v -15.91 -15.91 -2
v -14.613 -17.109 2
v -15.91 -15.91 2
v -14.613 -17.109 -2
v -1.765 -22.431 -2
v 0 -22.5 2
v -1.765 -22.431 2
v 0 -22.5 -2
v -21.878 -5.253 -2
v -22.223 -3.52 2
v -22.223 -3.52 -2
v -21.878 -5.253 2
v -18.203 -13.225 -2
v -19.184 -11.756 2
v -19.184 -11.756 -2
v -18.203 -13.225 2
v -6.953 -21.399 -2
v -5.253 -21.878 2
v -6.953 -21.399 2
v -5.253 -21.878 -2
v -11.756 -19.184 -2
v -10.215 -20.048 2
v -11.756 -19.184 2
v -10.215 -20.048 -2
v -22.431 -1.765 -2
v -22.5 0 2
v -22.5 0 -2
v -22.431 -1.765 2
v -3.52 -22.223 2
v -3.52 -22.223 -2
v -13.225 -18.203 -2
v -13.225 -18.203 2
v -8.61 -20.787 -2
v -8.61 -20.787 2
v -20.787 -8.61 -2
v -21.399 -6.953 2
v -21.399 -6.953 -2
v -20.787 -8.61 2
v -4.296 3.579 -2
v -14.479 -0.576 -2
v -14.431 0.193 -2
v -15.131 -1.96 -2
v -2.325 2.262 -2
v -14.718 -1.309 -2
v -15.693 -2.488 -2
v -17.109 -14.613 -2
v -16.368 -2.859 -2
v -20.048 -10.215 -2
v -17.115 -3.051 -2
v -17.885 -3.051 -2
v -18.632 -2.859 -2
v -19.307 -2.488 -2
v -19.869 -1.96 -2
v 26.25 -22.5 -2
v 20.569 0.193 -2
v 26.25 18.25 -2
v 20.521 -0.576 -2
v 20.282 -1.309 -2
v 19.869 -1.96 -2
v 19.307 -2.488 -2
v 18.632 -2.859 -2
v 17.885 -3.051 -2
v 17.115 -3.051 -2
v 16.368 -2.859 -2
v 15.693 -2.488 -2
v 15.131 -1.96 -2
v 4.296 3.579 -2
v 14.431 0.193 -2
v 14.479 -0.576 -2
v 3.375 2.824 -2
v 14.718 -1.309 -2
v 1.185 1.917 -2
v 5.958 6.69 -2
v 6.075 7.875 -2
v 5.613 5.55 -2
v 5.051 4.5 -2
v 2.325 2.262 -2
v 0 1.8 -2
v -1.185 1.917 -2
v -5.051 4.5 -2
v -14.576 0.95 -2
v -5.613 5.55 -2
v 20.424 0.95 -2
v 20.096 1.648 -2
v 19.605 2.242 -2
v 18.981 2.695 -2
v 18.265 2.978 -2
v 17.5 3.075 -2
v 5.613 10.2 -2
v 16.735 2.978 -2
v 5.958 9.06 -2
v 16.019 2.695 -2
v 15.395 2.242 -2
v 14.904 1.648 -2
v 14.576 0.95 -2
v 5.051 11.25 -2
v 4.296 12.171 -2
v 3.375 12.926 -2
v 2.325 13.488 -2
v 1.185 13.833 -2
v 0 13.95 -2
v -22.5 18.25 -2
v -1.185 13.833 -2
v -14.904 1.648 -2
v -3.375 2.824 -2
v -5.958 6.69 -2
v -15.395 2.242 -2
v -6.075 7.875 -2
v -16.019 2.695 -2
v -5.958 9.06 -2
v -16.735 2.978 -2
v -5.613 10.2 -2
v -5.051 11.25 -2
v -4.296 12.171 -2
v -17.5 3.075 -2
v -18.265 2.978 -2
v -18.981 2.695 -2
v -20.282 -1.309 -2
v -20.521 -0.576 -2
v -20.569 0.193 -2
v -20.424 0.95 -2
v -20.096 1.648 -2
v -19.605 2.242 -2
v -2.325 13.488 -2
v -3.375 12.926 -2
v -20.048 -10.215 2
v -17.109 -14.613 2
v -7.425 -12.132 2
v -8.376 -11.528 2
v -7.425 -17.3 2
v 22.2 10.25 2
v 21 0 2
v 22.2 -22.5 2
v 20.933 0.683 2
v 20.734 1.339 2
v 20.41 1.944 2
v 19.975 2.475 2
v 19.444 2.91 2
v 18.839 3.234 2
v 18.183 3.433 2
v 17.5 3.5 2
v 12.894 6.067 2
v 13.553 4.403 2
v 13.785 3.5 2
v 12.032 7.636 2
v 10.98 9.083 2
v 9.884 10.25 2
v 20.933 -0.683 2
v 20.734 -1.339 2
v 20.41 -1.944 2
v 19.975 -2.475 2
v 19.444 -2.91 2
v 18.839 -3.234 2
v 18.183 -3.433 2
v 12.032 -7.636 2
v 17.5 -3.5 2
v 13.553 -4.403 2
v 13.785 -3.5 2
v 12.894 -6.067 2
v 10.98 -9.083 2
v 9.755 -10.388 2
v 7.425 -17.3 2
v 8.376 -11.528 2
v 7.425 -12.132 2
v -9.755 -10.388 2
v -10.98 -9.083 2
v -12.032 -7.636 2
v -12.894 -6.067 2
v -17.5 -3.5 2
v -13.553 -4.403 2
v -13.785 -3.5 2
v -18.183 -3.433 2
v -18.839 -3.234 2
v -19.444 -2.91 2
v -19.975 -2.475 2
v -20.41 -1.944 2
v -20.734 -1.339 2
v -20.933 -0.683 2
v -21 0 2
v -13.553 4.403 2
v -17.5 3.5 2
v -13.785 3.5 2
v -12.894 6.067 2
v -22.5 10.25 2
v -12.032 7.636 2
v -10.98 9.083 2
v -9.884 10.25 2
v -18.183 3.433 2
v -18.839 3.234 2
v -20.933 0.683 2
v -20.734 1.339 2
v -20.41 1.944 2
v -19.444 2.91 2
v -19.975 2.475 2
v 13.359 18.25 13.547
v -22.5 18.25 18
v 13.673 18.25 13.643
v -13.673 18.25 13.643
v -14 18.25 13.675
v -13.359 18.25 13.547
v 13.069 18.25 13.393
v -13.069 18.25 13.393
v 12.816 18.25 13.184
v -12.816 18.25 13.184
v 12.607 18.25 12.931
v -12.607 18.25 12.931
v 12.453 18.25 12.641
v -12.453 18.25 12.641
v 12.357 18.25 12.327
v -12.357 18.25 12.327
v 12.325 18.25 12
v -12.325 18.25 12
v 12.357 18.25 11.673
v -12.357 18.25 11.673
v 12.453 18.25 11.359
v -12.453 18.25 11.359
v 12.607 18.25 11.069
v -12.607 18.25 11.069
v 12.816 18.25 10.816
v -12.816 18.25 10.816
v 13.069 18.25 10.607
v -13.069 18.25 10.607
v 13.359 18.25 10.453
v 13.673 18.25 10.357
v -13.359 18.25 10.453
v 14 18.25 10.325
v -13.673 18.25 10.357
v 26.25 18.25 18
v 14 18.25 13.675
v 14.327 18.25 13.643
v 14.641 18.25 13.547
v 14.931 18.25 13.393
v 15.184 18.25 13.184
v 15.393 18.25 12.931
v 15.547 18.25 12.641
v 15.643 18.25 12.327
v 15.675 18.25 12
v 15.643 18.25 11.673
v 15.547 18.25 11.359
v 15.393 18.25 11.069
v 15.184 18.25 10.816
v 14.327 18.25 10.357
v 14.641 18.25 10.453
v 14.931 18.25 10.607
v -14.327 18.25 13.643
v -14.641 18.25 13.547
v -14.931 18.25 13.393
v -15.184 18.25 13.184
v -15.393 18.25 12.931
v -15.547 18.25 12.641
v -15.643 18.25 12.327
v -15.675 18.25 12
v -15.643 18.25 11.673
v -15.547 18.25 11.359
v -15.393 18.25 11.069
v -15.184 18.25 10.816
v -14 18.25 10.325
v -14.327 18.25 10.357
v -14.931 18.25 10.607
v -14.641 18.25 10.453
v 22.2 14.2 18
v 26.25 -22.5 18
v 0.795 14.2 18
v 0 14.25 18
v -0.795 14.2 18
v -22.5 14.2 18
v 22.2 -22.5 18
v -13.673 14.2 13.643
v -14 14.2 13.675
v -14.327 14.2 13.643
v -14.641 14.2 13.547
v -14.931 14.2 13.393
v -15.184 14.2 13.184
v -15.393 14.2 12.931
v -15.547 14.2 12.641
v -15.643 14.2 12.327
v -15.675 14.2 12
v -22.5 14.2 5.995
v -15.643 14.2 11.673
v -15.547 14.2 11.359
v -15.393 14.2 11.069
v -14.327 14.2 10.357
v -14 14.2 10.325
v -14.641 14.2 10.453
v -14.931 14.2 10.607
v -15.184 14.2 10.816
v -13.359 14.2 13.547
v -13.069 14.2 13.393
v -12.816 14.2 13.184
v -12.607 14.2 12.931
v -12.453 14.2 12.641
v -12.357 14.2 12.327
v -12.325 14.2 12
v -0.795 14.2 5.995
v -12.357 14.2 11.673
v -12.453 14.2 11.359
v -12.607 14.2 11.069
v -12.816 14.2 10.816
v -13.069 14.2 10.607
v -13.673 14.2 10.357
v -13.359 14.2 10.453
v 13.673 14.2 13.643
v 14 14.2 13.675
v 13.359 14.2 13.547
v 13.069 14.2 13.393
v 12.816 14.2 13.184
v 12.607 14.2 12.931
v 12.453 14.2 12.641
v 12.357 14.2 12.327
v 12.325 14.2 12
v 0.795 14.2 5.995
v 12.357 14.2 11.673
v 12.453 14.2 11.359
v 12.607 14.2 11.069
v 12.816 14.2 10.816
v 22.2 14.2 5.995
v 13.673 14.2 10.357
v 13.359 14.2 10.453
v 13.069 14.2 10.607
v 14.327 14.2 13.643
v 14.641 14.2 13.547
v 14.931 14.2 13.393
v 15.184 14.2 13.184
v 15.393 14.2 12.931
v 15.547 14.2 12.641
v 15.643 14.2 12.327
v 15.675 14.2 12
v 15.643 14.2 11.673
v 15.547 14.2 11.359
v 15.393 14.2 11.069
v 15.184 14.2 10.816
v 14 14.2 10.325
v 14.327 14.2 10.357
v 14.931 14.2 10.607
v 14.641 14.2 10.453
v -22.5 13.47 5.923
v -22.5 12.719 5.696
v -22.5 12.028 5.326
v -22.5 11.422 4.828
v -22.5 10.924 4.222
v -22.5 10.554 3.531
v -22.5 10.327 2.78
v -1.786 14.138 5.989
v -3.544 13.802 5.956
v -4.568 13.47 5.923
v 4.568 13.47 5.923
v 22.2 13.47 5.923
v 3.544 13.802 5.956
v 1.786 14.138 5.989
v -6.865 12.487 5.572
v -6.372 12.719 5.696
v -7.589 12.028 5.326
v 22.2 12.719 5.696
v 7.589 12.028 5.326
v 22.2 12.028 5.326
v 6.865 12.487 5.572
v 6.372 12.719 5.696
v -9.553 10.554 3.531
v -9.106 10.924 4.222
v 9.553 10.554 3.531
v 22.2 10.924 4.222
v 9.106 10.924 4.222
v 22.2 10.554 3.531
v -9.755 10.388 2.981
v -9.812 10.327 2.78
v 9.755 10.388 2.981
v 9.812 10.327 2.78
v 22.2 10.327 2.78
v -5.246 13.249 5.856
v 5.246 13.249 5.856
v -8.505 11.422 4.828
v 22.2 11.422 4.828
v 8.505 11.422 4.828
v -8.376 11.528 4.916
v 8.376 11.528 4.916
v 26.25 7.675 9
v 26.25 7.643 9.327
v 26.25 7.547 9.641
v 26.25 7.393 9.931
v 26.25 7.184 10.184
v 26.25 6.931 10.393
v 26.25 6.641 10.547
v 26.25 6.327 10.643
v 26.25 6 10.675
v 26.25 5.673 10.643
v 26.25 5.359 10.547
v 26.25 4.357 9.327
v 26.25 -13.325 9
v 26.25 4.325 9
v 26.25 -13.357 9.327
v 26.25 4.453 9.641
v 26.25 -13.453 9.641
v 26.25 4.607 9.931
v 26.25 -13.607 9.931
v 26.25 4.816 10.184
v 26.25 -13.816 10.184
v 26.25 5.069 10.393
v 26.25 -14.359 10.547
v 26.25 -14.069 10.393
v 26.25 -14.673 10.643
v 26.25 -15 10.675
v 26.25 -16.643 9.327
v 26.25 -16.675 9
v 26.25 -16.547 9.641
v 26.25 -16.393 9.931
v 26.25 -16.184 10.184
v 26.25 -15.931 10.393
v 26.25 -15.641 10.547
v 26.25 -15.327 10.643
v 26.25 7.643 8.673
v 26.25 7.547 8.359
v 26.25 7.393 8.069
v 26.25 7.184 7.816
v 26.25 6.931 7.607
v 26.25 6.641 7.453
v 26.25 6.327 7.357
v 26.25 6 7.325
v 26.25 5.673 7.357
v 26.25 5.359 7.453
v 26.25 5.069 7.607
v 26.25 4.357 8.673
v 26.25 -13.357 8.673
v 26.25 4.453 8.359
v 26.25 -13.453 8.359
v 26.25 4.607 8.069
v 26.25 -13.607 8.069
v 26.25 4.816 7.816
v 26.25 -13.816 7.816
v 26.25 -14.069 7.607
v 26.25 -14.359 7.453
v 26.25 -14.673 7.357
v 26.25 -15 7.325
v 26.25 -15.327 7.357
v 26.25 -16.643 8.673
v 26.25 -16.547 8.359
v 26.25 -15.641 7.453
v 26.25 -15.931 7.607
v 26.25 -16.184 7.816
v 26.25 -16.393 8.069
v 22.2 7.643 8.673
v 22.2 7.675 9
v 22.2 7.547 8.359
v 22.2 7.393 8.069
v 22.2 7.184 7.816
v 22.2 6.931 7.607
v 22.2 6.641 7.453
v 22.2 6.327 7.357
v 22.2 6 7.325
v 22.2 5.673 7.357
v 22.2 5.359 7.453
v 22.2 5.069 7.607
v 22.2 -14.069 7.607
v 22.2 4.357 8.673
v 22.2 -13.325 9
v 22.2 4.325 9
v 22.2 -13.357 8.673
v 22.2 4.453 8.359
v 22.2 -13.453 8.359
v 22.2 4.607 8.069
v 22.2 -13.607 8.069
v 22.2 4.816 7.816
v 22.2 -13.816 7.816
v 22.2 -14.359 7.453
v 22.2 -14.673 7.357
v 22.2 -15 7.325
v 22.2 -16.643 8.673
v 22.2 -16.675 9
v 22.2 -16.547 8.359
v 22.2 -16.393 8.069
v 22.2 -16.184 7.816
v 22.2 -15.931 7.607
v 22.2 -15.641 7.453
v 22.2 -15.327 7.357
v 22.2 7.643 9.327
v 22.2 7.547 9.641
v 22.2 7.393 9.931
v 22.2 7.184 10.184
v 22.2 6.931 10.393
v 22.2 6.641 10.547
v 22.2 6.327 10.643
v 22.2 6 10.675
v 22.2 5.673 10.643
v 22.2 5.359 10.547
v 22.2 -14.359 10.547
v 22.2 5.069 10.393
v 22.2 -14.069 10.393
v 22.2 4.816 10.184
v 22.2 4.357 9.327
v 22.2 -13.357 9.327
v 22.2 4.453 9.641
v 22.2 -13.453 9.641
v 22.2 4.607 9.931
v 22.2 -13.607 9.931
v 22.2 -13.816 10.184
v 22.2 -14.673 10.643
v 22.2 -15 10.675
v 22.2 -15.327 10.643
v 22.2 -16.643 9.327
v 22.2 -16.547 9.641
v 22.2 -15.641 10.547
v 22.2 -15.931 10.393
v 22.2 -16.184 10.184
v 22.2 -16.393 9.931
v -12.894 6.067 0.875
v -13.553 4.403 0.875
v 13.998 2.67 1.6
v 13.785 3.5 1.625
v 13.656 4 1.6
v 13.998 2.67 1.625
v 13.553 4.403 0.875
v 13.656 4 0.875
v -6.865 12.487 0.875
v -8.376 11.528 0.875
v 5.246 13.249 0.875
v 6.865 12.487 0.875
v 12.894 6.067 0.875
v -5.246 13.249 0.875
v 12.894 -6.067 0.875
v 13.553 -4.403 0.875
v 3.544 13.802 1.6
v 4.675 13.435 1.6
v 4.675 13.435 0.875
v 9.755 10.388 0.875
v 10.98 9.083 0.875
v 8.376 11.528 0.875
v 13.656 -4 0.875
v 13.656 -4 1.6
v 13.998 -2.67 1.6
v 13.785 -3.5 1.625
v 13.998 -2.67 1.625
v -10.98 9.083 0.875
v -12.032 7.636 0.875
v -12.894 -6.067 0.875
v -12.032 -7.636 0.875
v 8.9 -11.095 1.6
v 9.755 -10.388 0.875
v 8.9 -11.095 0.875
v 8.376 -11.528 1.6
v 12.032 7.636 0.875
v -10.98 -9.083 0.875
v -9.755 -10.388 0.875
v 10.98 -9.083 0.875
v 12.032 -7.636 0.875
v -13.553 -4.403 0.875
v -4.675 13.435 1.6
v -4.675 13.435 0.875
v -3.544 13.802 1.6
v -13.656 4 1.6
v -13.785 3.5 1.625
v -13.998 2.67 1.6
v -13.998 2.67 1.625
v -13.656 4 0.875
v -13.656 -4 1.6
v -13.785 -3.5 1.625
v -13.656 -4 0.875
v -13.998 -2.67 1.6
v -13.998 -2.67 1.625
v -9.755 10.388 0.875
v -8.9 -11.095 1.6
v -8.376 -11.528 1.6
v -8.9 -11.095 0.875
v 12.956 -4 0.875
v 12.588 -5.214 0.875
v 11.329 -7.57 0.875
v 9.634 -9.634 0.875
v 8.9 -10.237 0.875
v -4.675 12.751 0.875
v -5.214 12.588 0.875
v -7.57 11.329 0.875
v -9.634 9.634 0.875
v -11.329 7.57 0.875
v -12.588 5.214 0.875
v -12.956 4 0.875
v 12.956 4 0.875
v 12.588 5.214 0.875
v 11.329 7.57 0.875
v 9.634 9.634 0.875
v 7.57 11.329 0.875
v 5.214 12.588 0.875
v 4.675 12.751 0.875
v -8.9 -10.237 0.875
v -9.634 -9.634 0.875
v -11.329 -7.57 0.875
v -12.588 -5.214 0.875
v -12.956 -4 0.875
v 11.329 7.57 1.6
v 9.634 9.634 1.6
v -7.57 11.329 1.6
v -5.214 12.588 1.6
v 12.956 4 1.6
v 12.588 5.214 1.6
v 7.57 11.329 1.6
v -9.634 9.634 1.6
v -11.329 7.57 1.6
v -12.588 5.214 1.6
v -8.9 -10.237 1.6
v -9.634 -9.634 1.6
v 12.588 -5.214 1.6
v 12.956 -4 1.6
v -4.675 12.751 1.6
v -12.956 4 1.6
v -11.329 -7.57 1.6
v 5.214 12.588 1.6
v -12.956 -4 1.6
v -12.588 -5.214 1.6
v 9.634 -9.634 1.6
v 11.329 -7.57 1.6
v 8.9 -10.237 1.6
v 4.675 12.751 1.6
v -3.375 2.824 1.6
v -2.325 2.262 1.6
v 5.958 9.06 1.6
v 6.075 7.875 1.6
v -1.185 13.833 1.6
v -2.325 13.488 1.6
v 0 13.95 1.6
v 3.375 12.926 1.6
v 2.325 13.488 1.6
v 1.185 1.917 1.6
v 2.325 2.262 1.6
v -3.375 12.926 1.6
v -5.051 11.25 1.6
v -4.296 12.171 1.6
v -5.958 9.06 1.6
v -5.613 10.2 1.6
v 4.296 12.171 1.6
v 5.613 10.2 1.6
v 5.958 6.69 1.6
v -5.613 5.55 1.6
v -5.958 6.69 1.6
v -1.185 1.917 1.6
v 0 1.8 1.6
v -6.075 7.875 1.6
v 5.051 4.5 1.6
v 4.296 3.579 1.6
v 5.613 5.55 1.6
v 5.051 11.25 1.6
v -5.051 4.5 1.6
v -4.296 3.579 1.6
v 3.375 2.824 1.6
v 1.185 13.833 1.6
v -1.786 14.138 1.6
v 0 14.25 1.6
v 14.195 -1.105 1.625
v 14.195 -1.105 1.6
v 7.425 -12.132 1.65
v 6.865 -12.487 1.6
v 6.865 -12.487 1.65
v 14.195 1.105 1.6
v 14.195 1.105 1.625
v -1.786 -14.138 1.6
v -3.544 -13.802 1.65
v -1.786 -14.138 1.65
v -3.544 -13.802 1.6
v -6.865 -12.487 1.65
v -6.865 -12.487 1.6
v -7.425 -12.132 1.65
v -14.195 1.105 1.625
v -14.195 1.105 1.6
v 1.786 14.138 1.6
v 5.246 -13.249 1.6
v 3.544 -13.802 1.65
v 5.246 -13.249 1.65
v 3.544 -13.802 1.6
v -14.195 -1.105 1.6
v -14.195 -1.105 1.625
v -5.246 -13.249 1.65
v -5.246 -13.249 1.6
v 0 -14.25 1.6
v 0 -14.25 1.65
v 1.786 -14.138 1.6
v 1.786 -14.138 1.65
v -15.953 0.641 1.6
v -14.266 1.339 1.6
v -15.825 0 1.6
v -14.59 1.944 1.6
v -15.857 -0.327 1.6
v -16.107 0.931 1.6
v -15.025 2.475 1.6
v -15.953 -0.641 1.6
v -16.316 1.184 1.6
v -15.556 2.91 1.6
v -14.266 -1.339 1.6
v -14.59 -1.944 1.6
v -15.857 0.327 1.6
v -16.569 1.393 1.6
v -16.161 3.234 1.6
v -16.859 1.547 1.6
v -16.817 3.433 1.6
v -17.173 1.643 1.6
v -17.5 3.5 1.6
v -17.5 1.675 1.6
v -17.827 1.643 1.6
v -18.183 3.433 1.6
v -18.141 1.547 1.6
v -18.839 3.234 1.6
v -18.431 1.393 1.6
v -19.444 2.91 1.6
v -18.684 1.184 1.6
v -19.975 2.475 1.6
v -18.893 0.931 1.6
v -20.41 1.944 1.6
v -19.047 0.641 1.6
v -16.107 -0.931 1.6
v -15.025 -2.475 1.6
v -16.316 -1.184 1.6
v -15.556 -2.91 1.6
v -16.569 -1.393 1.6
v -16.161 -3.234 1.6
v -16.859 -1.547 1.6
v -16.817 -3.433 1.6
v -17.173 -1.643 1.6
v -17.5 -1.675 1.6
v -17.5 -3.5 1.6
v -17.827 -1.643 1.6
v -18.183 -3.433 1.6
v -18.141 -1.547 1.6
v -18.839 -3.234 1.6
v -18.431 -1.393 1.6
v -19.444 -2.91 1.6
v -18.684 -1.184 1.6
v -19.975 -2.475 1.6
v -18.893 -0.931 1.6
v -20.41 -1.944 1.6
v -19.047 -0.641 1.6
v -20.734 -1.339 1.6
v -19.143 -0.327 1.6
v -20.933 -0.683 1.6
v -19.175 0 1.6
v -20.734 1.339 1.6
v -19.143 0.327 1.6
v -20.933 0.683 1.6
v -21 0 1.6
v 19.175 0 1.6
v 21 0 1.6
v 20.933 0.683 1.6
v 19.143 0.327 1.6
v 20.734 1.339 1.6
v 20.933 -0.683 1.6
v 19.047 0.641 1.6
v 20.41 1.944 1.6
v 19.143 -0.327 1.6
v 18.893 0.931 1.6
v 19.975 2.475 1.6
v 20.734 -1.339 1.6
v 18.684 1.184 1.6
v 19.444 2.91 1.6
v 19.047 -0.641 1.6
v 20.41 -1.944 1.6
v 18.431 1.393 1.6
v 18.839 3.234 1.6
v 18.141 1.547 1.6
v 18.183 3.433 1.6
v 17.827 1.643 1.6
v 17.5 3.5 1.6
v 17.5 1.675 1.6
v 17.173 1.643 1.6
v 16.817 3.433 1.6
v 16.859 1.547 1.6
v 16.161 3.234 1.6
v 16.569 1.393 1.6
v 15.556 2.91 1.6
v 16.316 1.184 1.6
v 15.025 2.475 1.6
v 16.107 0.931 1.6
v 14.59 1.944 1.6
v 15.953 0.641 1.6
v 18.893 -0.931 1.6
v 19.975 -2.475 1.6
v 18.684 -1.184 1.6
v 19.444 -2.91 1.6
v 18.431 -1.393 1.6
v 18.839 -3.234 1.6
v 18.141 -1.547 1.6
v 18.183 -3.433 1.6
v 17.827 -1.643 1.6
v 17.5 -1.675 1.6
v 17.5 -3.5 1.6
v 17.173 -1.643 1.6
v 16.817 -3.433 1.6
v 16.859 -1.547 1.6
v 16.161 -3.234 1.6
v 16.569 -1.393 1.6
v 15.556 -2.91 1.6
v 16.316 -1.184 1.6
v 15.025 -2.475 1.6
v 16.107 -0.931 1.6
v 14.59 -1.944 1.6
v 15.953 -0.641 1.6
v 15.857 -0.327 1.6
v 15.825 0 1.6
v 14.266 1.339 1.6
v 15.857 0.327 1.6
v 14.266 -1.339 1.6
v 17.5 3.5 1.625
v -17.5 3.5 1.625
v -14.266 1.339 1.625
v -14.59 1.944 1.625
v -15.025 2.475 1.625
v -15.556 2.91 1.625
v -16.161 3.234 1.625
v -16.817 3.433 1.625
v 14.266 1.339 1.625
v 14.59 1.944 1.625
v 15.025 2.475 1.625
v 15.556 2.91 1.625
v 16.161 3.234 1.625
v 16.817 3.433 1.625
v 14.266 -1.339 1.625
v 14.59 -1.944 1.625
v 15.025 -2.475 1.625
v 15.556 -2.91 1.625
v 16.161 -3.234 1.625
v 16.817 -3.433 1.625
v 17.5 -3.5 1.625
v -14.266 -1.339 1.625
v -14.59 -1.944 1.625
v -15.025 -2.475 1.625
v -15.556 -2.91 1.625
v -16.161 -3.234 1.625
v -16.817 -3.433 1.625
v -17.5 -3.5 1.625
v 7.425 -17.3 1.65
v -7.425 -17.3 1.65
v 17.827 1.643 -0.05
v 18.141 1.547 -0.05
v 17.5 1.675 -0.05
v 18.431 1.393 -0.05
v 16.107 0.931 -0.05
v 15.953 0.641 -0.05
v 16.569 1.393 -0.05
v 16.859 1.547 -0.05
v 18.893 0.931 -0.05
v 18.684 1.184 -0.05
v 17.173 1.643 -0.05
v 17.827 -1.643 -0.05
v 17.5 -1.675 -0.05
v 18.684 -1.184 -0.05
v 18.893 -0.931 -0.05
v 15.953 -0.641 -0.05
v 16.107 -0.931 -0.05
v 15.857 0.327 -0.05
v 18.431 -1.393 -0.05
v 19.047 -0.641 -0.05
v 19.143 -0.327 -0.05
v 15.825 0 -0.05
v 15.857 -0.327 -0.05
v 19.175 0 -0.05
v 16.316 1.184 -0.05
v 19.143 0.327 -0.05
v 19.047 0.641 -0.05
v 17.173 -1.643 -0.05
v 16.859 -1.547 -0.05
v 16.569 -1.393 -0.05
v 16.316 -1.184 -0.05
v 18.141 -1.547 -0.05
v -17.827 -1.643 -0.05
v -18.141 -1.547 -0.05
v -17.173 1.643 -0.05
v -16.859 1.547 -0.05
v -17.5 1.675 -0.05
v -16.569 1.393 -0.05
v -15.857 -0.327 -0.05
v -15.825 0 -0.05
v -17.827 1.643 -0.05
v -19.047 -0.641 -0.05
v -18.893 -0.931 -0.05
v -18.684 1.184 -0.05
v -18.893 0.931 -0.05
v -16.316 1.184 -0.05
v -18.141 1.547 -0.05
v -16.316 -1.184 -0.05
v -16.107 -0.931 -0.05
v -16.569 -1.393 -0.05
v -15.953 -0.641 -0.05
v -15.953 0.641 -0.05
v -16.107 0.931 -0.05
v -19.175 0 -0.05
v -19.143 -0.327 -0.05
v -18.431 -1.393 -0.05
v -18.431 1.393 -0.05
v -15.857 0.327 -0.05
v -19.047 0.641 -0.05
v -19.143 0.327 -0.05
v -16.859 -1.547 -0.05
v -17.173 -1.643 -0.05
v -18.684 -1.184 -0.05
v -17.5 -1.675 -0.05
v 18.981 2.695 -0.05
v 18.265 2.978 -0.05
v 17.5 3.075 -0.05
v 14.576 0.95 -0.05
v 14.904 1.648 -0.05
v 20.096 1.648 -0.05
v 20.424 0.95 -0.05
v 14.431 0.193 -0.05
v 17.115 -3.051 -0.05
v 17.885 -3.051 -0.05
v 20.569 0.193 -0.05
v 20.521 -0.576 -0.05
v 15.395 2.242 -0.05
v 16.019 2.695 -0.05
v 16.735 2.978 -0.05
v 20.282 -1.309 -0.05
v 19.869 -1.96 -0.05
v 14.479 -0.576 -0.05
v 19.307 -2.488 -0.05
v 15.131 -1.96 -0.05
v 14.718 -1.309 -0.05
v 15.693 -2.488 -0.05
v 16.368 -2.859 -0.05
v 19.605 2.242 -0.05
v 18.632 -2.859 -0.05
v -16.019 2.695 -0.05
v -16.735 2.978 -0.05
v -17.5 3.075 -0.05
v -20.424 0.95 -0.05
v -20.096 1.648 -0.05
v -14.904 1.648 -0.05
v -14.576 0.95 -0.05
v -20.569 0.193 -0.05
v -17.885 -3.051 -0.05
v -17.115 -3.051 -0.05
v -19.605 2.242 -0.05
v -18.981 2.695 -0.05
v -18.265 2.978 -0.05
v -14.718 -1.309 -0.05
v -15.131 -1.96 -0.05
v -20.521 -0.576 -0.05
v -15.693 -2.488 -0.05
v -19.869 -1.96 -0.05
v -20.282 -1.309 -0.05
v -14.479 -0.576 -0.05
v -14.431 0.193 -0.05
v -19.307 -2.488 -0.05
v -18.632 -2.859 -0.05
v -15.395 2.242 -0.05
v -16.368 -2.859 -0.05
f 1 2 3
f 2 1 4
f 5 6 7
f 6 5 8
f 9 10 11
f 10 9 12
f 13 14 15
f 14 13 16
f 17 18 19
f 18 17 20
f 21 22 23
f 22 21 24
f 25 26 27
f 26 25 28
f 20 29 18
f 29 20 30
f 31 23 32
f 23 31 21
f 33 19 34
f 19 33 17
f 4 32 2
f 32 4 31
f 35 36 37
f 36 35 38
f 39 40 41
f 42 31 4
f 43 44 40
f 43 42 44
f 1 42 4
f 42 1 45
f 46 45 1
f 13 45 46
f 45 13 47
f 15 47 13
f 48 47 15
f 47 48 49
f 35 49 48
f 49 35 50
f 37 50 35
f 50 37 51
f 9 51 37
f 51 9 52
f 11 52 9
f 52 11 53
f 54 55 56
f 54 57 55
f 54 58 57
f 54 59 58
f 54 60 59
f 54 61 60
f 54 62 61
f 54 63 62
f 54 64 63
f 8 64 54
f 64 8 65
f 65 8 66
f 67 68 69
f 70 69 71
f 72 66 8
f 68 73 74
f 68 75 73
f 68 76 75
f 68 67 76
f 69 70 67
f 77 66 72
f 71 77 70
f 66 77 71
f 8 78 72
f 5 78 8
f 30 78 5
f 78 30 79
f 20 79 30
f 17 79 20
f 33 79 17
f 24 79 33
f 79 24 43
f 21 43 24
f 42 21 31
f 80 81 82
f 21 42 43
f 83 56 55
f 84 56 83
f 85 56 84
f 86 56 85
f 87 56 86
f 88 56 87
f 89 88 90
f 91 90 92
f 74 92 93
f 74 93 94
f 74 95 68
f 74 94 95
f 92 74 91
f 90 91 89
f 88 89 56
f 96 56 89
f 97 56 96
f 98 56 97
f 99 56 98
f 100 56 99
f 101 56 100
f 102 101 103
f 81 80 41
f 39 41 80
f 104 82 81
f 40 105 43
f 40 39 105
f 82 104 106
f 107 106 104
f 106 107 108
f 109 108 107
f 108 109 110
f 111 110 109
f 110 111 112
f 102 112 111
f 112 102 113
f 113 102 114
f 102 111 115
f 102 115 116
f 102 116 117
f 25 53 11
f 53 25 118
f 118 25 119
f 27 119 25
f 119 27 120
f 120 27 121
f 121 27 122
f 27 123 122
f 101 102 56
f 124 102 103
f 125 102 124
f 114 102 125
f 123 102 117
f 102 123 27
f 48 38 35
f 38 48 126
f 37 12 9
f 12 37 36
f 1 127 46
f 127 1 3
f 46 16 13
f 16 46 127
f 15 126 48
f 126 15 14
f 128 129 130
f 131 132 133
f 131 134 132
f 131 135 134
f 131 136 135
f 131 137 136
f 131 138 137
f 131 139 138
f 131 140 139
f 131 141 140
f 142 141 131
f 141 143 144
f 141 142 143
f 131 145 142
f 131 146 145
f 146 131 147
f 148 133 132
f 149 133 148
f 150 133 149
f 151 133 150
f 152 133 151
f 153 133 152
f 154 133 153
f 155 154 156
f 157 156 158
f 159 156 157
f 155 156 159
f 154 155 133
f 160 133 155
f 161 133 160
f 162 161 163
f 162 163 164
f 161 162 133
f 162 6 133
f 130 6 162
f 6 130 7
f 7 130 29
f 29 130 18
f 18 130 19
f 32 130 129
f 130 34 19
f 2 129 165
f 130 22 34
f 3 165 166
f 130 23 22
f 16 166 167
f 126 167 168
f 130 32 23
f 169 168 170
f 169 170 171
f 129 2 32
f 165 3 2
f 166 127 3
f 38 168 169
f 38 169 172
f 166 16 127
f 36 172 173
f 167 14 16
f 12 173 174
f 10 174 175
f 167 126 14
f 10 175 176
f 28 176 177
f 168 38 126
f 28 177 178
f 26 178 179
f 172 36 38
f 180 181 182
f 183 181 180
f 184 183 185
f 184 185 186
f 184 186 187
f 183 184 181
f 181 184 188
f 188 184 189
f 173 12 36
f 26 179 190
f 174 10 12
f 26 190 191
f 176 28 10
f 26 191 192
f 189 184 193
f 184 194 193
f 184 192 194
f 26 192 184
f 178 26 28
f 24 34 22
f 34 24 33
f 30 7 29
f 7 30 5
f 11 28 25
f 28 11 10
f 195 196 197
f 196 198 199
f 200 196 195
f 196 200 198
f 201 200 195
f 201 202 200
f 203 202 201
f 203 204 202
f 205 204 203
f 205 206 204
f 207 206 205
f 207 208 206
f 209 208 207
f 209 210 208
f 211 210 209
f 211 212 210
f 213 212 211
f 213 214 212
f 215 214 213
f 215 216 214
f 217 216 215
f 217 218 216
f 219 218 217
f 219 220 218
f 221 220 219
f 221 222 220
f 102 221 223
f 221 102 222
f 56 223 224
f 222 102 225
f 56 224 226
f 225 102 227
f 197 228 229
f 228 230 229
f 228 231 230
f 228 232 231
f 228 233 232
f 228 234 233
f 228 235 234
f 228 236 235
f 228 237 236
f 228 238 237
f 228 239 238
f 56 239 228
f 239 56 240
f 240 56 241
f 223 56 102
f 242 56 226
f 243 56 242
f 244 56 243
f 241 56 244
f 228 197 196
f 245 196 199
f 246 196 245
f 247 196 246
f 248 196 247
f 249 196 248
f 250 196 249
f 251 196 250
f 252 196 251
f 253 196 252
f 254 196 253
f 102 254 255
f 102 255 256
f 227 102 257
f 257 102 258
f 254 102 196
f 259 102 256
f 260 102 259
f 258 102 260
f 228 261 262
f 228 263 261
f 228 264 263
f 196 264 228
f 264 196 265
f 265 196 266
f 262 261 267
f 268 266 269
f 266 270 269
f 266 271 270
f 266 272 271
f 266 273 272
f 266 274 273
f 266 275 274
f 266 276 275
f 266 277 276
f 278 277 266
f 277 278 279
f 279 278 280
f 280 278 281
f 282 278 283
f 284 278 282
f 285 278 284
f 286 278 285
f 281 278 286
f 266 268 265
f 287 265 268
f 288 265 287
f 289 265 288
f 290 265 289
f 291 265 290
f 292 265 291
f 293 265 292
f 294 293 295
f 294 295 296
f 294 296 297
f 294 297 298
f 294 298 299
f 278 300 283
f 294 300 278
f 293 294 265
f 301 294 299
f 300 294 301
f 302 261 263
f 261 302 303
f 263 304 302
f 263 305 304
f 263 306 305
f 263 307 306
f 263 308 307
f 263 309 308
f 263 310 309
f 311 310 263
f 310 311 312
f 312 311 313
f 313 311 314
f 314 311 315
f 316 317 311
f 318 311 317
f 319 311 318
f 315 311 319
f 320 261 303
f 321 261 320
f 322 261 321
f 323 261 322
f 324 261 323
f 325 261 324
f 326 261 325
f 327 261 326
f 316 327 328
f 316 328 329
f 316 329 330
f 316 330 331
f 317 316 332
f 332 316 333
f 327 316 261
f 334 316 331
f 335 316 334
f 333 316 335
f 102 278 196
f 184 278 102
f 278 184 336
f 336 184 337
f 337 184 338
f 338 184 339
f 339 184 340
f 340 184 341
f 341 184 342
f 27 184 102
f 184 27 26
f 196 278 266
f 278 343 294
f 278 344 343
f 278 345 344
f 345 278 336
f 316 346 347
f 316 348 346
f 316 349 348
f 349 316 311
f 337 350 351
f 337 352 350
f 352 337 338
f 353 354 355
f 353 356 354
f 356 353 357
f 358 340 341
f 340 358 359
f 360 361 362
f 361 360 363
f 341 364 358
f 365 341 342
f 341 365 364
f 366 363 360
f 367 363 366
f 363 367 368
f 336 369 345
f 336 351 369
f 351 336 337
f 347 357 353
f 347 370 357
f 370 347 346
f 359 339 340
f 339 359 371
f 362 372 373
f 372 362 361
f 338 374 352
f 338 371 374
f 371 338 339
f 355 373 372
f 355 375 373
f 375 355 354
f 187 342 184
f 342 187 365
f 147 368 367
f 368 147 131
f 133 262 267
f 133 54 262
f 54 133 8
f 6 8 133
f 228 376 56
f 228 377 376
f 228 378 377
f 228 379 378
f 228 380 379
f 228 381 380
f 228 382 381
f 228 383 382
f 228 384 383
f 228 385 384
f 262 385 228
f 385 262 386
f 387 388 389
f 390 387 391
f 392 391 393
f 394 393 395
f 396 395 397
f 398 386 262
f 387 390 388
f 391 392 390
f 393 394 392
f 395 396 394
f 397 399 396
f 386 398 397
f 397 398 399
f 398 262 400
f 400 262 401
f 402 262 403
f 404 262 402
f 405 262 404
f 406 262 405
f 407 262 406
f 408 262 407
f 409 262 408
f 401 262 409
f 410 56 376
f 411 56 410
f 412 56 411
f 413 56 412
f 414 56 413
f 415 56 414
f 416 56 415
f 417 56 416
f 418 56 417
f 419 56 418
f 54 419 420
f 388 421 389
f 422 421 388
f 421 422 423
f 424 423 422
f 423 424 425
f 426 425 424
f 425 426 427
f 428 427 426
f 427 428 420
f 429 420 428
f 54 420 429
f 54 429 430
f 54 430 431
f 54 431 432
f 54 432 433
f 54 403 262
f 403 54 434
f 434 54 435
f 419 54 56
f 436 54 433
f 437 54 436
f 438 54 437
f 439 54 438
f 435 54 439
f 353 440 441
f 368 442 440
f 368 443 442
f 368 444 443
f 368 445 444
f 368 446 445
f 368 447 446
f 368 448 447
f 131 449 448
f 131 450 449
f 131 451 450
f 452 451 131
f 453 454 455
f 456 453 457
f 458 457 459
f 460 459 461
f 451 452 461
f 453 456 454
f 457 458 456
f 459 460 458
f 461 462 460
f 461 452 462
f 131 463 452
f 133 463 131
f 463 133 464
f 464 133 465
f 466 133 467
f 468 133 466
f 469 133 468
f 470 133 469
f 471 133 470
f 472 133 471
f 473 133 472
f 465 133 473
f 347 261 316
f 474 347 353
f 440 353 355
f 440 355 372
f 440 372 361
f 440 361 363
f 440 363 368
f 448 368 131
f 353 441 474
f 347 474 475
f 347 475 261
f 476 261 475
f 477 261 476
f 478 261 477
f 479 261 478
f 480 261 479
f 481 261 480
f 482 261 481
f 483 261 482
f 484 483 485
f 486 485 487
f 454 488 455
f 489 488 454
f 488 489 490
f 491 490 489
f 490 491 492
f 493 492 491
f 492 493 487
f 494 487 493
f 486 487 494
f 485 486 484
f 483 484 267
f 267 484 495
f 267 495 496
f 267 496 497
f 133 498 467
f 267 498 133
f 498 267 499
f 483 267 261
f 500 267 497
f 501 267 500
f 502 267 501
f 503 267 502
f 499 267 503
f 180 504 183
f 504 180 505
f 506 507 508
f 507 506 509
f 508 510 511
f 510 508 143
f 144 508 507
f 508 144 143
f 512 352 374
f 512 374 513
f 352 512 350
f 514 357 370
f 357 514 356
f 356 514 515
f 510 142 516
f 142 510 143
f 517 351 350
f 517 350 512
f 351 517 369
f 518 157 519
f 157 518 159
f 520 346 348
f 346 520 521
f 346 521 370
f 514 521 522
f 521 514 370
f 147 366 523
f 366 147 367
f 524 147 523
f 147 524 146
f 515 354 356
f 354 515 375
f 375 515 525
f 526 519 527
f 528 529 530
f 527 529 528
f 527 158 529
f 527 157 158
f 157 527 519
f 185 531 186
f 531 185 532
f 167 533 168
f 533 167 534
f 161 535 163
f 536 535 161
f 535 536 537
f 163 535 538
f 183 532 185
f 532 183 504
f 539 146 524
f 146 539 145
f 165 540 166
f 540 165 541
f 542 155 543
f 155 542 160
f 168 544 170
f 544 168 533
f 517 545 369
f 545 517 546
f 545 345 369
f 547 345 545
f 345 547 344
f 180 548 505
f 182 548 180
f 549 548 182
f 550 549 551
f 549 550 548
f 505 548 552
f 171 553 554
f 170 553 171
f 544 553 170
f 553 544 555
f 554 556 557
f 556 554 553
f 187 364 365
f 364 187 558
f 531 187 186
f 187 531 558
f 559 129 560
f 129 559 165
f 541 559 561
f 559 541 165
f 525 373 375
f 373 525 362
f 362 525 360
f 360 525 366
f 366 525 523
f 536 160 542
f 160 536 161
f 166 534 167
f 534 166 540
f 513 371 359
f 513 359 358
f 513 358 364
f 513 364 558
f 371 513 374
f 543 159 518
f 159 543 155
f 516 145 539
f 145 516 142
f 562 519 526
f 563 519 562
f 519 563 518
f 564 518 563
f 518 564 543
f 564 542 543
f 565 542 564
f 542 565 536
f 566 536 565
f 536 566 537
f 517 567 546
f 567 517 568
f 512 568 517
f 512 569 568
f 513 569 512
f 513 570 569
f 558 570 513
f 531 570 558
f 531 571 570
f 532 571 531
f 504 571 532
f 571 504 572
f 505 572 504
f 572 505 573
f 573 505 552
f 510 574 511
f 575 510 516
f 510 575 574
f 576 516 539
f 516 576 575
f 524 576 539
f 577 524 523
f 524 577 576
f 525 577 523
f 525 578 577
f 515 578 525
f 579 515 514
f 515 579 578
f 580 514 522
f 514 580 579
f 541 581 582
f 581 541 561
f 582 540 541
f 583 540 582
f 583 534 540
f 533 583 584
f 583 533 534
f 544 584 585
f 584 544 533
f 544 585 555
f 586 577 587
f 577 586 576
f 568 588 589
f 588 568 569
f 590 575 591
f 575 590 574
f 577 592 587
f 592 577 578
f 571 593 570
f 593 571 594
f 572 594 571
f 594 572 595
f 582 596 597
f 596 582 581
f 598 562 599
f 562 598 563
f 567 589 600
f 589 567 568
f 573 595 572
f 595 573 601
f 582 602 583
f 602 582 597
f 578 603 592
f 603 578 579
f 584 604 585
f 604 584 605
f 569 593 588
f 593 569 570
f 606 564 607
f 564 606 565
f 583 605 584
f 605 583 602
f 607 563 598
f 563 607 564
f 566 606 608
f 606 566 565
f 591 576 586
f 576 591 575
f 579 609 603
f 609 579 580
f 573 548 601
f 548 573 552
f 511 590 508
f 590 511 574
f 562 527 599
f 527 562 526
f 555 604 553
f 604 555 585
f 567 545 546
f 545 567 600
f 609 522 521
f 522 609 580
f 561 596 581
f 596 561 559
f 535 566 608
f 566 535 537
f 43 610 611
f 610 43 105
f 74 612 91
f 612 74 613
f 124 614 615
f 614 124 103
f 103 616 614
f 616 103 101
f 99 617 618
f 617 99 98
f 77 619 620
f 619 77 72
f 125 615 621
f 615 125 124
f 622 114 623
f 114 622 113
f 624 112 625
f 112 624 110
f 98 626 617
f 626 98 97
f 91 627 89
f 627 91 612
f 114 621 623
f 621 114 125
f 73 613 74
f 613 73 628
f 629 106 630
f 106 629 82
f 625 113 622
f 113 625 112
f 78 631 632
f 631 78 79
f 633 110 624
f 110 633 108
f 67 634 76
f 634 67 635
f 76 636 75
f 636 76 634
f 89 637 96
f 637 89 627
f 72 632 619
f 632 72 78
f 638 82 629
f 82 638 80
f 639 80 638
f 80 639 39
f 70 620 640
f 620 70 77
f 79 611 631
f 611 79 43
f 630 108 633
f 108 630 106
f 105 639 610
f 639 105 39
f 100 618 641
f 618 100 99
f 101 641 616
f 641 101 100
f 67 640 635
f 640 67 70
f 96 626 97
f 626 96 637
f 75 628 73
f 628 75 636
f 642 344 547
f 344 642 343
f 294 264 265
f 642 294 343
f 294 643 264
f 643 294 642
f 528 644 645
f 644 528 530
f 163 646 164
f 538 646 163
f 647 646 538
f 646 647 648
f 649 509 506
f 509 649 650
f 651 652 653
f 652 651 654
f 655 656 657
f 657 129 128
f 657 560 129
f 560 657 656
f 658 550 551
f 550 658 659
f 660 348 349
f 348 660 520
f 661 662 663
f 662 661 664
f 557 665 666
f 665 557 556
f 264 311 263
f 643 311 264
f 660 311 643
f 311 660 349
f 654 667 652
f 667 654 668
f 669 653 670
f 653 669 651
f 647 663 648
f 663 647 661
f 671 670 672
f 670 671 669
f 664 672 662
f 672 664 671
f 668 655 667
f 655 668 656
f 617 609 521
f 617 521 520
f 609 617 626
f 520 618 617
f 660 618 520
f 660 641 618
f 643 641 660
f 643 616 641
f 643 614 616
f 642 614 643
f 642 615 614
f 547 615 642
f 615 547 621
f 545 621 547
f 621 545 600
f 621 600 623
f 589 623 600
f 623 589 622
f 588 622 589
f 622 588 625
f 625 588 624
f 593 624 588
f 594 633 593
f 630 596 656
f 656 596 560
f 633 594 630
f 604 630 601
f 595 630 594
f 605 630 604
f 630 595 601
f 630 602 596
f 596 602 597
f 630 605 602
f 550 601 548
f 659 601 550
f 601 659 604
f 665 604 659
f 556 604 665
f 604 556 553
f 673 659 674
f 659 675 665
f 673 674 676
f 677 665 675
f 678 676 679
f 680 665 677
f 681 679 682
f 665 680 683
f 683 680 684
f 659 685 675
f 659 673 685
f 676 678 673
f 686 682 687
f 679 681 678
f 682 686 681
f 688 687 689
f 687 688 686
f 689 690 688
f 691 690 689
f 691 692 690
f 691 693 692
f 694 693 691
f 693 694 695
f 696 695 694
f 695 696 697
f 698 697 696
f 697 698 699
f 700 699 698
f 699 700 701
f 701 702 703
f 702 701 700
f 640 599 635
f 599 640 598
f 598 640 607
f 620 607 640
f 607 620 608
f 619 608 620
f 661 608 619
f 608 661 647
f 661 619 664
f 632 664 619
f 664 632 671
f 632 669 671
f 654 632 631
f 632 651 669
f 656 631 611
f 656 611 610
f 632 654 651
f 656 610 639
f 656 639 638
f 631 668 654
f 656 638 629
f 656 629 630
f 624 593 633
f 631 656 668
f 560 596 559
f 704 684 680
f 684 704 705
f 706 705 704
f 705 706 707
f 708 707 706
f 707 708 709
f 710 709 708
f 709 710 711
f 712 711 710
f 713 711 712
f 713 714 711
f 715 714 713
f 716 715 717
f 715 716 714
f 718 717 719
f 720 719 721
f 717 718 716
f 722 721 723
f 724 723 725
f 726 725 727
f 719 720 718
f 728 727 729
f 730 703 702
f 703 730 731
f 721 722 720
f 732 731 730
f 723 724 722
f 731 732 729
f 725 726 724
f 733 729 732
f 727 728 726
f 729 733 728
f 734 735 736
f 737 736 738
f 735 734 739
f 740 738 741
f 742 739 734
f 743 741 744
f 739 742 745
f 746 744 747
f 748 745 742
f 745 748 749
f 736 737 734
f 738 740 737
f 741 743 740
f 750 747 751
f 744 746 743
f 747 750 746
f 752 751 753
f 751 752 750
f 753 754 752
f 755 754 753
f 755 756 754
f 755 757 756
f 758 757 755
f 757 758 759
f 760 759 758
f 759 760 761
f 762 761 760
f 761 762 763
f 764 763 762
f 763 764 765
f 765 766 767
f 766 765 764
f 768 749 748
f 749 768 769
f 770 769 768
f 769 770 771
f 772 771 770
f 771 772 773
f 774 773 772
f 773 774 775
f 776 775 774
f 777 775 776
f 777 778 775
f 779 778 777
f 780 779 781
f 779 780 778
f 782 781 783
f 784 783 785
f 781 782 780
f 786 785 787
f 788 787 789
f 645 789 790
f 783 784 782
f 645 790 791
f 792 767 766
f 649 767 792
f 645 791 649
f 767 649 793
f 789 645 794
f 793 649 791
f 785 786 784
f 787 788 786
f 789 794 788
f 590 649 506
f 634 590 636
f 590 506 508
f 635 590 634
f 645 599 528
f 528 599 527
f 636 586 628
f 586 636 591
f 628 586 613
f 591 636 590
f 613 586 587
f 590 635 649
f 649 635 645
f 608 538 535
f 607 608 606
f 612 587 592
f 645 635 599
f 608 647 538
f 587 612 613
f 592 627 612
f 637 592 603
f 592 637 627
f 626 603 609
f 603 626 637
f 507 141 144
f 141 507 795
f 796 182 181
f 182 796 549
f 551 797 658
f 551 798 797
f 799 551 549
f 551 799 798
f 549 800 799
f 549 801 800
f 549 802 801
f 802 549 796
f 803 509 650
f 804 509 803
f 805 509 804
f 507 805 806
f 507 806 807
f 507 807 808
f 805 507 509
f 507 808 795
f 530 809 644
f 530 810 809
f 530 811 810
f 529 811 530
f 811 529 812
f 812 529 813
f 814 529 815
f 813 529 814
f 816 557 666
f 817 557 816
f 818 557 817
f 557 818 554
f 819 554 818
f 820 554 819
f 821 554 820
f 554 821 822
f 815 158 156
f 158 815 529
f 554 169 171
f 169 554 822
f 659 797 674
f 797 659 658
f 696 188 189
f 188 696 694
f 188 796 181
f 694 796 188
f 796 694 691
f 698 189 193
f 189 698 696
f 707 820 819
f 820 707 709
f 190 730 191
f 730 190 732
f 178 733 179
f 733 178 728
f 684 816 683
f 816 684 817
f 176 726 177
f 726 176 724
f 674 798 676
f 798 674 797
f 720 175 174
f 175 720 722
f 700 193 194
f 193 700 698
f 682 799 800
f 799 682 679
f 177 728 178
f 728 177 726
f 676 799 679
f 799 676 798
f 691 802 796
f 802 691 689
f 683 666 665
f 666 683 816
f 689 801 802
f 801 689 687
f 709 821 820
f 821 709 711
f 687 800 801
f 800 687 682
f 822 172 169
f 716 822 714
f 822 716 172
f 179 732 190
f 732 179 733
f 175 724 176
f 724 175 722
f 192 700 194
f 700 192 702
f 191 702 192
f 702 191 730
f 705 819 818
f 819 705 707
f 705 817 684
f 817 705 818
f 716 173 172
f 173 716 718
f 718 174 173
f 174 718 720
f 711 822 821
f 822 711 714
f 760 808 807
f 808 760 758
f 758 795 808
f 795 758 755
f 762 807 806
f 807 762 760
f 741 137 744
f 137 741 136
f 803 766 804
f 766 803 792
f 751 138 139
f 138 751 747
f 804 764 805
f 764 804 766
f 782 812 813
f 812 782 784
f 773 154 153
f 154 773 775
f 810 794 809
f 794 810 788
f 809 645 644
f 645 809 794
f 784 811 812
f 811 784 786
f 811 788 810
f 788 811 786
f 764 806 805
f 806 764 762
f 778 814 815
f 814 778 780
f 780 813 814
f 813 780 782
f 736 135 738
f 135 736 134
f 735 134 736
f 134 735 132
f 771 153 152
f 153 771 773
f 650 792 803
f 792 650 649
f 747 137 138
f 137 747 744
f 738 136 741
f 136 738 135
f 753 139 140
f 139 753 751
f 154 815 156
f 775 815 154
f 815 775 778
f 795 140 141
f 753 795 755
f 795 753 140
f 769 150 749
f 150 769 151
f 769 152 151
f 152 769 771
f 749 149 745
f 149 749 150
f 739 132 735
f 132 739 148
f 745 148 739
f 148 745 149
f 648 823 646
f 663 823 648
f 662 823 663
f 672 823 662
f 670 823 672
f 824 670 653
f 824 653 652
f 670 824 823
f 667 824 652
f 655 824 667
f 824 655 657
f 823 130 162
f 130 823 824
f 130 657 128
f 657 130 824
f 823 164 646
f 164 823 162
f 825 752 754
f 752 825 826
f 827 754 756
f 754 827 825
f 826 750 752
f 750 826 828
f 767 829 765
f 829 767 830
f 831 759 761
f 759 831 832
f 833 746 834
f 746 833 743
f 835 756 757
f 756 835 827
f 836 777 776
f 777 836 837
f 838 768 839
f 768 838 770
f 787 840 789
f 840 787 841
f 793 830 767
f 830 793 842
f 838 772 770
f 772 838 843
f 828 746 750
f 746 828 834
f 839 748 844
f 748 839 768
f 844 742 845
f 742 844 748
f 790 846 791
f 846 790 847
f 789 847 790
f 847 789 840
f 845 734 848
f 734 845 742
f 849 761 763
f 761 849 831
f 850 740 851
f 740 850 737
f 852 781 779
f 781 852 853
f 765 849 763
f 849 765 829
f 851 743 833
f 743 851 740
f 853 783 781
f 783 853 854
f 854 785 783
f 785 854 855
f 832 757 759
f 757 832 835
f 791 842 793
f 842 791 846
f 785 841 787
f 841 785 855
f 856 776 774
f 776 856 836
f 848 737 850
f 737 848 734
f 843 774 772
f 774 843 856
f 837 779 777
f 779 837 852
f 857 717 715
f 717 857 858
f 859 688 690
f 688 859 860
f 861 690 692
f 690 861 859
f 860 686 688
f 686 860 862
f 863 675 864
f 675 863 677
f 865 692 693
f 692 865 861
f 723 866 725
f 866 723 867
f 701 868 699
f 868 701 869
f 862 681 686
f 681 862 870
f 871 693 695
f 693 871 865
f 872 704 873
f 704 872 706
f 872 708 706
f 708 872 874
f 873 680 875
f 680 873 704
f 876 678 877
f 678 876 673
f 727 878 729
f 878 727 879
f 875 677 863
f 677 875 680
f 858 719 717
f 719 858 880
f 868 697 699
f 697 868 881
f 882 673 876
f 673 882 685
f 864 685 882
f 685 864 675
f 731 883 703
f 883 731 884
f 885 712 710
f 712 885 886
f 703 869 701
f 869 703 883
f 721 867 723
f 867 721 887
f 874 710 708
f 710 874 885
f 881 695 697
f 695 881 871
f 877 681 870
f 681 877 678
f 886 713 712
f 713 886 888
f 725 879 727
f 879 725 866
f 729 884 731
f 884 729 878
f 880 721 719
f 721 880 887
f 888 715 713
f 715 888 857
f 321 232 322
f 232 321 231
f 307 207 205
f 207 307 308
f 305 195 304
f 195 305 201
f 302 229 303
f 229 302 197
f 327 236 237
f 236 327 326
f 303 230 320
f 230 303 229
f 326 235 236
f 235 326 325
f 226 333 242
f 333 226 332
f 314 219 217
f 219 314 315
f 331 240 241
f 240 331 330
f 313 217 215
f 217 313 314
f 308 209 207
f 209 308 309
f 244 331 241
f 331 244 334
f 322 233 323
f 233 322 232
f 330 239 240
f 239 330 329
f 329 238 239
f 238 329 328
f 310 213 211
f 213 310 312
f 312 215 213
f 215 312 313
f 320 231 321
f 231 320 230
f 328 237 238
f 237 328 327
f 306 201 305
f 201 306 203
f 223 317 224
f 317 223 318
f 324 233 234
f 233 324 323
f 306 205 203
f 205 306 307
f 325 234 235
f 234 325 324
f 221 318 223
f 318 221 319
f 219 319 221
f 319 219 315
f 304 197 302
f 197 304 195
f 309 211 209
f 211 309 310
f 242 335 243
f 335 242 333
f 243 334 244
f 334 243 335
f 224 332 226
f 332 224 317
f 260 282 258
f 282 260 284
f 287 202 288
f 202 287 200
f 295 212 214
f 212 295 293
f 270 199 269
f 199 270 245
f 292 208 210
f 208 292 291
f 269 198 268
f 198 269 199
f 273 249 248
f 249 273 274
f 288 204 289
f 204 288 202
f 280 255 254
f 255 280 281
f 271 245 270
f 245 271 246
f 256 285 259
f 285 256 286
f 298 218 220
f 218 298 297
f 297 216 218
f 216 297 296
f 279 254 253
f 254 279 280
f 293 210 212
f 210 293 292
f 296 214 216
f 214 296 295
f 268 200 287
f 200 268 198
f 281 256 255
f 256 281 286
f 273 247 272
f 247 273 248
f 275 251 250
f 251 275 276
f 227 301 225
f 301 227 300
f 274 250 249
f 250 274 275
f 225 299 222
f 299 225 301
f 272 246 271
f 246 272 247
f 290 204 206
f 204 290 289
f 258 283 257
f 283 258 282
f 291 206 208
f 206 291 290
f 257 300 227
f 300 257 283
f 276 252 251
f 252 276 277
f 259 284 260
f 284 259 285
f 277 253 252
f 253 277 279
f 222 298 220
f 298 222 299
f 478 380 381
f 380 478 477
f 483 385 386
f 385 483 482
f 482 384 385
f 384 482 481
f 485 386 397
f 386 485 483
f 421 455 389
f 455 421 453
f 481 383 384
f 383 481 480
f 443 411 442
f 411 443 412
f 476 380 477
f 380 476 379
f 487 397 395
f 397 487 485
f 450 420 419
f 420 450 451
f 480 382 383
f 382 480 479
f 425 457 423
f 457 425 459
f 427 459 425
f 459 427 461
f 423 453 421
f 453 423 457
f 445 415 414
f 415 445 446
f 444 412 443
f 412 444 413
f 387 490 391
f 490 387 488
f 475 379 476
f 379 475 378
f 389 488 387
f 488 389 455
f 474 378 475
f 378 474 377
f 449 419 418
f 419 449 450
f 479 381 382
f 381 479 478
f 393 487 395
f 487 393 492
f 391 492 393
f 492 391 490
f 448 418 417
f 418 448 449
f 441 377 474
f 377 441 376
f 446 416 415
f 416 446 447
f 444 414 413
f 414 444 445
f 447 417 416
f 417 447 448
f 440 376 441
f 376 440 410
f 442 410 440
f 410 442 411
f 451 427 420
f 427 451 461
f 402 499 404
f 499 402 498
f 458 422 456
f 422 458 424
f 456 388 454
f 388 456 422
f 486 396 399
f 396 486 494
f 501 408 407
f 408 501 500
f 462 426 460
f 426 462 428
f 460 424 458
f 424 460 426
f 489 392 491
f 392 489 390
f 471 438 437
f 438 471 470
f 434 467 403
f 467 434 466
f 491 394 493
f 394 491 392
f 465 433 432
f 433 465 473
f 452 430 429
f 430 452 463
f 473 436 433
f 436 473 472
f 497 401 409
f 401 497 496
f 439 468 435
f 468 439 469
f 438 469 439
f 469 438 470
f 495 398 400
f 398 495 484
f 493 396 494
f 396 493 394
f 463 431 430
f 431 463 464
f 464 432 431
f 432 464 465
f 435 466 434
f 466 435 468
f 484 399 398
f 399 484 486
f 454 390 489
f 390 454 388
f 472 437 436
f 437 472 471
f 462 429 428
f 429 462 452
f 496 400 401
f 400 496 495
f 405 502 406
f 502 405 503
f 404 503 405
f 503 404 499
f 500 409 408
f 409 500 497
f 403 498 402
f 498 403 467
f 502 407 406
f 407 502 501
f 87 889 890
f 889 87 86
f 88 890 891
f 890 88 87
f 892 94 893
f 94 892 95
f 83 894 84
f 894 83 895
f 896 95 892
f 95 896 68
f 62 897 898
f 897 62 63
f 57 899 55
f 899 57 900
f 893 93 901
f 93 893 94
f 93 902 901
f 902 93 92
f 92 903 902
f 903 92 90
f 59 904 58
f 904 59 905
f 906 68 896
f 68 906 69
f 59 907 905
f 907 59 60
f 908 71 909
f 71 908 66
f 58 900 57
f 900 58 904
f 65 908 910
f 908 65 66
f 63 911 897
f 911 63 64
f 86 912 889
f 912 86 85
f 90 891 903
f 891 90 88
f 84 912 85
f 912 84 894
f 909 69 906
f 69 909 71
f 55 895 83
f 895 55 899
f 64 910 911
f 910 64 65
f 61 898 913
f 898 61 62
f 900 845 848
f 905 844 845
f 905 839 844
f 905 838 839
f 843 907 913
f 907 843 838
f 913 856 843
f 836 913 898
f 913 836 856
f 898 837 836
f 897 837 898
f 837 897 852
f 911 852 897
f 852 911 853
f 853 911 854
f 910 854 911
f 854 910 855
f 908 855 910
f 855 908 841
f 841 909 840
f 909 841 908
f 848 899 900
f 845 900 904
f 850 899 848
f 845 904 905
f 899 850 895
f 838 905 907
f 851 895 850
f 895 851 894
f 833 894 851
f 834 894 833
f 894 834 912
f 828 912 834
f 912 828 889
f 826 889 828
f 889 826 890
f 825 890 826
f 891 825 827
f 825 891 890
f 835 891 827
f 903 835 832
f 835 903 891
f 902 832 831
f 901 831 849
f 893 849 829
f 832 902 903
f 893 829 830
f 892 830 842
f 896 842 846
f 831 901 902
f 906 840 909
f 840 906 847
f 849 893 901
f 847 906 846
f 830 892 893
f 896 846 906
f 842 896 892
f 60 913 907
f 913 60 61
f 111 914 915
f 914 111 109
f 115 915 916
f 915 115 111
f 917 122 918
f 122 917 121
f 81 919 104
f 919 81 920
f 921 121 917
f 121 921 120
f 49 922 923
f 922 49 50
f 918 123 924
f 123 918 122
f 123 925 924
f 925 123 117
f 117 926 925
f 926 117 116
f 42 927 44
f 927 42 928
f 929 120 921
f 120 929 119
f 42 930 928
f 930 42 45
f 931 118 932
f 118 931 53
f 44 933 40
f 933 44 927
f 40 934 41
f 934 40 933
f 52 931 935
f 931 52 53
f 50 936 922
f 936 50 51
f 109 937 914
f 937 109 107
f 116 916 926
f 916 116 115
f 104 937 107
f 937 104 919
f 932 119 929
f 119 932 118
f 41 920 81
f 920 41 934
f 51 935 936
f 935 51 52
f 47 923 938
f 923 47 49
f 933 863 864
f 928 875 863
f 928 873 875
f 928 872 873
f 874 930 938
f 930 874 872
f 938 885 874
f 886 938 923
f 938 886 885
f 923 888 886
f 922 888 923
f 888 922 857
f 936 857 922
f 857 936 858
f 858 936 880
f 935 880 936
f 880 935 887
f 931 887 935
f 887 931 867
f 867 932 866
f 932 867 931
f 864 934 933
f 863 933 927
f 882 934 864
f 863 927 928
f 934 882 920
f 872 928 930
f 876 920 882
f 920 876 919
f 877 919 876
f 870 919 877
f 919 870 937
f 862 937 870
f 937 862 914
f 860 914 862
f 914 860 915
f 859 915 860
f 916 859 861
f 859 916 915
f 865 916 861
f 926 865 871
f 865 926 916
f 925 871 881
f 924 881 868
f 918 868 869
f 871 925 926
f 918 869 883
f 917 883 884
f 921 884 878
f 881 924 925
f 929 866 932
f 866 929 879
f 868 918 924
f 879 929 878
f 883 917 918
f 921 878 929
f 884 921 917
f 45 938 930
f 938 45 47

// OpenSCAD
// Bracket for  28BYJ-48 stepper motor
// 28BYJ-48 model from RGriffoGoes www.thingiverse.com/thing:204734
// added motor details by J.Beale 21 July 2014
// Bracket v.3 by J.Beale 10 Aug 2014

slop = 0.25;  // printer tolerance

// =========================================================
// stepper motor body model

MBH = 18.8;   // motor body height
MBD = 28.25+slop;  // motor body OD
SBD = 9.1+slop;    // shaft boss OD
SBH = 1.45;   // shaft boss height above motor body
SBO = 7.875;  // offset of shaft/boss center from motor center
//SHD = 4.93+slop*2;   // motor shaft OD+ countersink for boss
SHD = 11.9+slop;   // motor shaft OD (larger clearance hole)
SHDF = 3.0;   // motor shaft diameter, across flats
SHHF = 6.0;   // motor shaft flats height, or depth in from end
SHHF = 0.0;   // assume round shaft for purposes of bracket
SHH = 9.75;   // height of shaft above motor body 

MBFH = 0.7;   // height of body edge flange protruding above surface
MBFW = 1.0+slop;   // width of edge flange
MBFNW = 8;    // width of notch in edge flange
MBFNW2 = 17.8;  // width of edge flange notch above wiring box

MHCC = 35.0;  // mounting hole center-to-center
MTH  = 0.8;   // mounting tab thickness
MTW  = 7.0;   // mounting tab width
// MTHID = 4.0;  // mounting tab hole inner diameter
MTHID = 3.0;  // mounting tab hole inner diameter
WBH  = 16.7;  // plastic wiring box height
WBW  = 14.6+slop;  // plastic wiring box width
WBD  = 31.3+slop;  // body diameter to outer surface of wiring box

WRD = 1.0;     // diameter of electrical wires
WRL = 30;      // length of electrical wires
WRO = 2.2;		// offset of wires below top motor surface
// =========================================================
// corner bracket for motor

MSOD = 5.9 + slop;  // M3 mounting screw head diameter
MSTH = 2.0;  // M3 screw head thickness (for countersink)
//MSTH = 0; // set to zero for no screwhead countersink
MSSD = 3.1 + slop;  // M3 screw diameter clearance hole
Bthick = 4;  // thickness of bracket
BFwidth = 20; // bottom flange width
BFZboff = 12;  // bottom flange bolt offset along Z axis
SFZboff = 9;  // side flange bolt offset along Z axis
BFboff = MHCC*0.4;  // bottom flange bolt offset
Bdia = (MHCC+10);  // diameter of bracket face

// =========================================================
fn = 80;
eps = 0.05;   // small number to avoid coincident faces


module StepMotor28BYJ()
{
  difference(){
    union(){
	   color("gray") translate([0,0,-(MBH+MBFH)/2])
		  difference() {  // flange at top rim
         cylinder(h = MBFH+eps, r = MBD/2, center = true, $fn = 50);
         cylinder(h = MBFH+2*eps, r = (MBD-MBFW)/2, center = true, $fn = 32);
			cube([MBFNW,MHCC,MBFH*2],center=true); // notches in rim
			cube([MBD+2*MBFW,SBD,MBFH*2],center=true);
		   translate([-MBD/2,0,0]) cube([MBD,MBFNW2,MBFH*2],center=true);
        }
		color("gray") // motor body
			cylinder(h = MBH, r = MBD/2, center = true, $fn = 50);
		color("gray") translate([SBO,0,-SBH])	// shaft boss
			cylinder(h = MBH, r = SBD/2, center = true, $fn = 32);

		translate([SBO,0,-SHH])	// motor shaft
        difference() {
			color("gold") cylinder(h = MBH, r = SHD/2, center = true, $fn = 32);
				// shaft flats
		   color("red") translate([(SHD+SHDF)/2,0,-(eps+MBH-SHHF)/2]) 
				cube([SHD,SHD,SHHF], center = true);
		   color("red") translate([-(SHD+SHDF)/2,0,-(eps+MBH-SHHF)/2]) 
				cube([SHD,SHD,SHHF], center = true);
        }


		color("Silver") translate([0,0,-(MBH-MTH-eps)/2]) // mounting tab 
			cube([MTW,MHCC,MTH], center = true);				
		color("Silver") translate([0,MHCC/2,-(MBH-MTH)/2]) // mt.tab rounded end
			cylinder(h = MTH, r = MTW/2, center = true, $fn = 32);
		color("Silver") translate([0,-MHCC/2,-(MBH-MTH)/2]) // mt.tab rounded end
			cylinder(h = MTH, r = MTW/2, center = true, $fn = 32);


		color("blue") translate([-(WBD-MBD),0,eps-(MBH-WBH)/2]) // plastic wire box
			cube([MBD,WBW,WBH], center = true);
	   color("blue") translate([-2,0,0])	
			cube([24.5,16,15], center = true);
		}

				// mounting holes in tabs on side
		color("red") translate([0,MHCC/2,-MBH/2])	
				cylinder(h = 2, r = MTHID/2, center = true, $fn = 32);
		color("red") translate([0,-MHCC/2,-MBH/2])	
				cylinder(h = 2, r = MTHID/2, center = true, $fn = 32);
		}
}

module MOT() {
 translate([0,0,-MBH/2]) 
 rotate([180,0,0]) StepMotor28BYJ();  // motor body (without wires)
}


module bracket() {
difference() {
 union() {
  translate([0,0,-2]) cylinder(h=Bthick, r=Bdia/2, $fn=fn);  // round face
  translate([-eps + MBD/2,-Bdia/2,-BFwidth+Bthick/2]) 
		cube([Bthick+eps,Bdia,BFwidth]); // bottom flange
  translate([-0,-Bdia/2,-Bthick/2]) 
	cube([Bdia,Bdia,Bthick]); // square edge joining round face to bt. flange
  translate([MBD/2,Bdia/2,-Bthick/2]) rotate([90,0,0]) 
	cylinder(r=Bthick,h=Bdia,$fn=32); // round fillet at flange

  translate([-Bdia/2,-eps + (MBD)/2 + Bthick*2,-BFwidth+Bthick/2]) 
		cube([Bdia,Bthick+eps,BFwidth]); // side flange
  translate([-0,0,-Bthick/2]) rotate([0,0,90])
	cube([Bdia/2,Bdia/2,Bthick]); // square joining round face to side flange
 }
 union() {
   translate([4+MBD/2,-MBD,-MBD]) cube([MBD*2,MBD*2,MBD*2]);
   translate([0,MHCC/2,-10])	// motor mounting bolt
				cylinder(h = 30, r = MSSD/2, center = true, $fn = 32);
   translate([0,-MHCC/2,-10])	// motor mounting bole
				cylinder(h = 30, r = MSSD/2, center = true, $fn = 32);
   translate([10,BFboff,-BFZboff]) rotate([0,90,0]) 	// bt.flange mounting bolt
				cylinder(h = 30, r = MSSD/2, center = true, $fn = 32);
   translate([10,-BFboff,-BFZboff]) rotate([0,90,0]) 	// bt.flange mounting bolt
				cylinder(h = 30, r = MSSD/2, center = true, $fn = 32);

   translate([6,MHCC/2,-SFZboff]) rotate([0,90,90]) 	// side flange mounting bolt
				cylinder(h = 30, r = MSSD/2, center = true, $fn = 32);
   translate([-15,MHCC/2,-SFZboff]) rotate([90,0,0]) 	// side flange mounting bolt
				cylinder(h = 30, r = MSSD/2, center = true, $fn = 32);


   color("white") translate([0,MHCC/2,((Bthick/2) - MSTH + eps)]) 
	 cylinder(r=MSOD/2, h=MSTH, $fn=25); // motor screw countersink
   color("white") translate([0,-MHCC/2,((Bthick/2) - MSTH + eps)])  
	 cylinder(r=MSOD/2, h=MSTH, $fn=25); // motor screw countersink

   translate([0,0,-1.6]) MOT(); // body of motor
   //translate([0,0,-10]) cube([50,50,50]); // DEBUG cutaway view
 }
}
} // end module()

rotate([180,0,90]) 
  bracket();  // show the motor bracket
